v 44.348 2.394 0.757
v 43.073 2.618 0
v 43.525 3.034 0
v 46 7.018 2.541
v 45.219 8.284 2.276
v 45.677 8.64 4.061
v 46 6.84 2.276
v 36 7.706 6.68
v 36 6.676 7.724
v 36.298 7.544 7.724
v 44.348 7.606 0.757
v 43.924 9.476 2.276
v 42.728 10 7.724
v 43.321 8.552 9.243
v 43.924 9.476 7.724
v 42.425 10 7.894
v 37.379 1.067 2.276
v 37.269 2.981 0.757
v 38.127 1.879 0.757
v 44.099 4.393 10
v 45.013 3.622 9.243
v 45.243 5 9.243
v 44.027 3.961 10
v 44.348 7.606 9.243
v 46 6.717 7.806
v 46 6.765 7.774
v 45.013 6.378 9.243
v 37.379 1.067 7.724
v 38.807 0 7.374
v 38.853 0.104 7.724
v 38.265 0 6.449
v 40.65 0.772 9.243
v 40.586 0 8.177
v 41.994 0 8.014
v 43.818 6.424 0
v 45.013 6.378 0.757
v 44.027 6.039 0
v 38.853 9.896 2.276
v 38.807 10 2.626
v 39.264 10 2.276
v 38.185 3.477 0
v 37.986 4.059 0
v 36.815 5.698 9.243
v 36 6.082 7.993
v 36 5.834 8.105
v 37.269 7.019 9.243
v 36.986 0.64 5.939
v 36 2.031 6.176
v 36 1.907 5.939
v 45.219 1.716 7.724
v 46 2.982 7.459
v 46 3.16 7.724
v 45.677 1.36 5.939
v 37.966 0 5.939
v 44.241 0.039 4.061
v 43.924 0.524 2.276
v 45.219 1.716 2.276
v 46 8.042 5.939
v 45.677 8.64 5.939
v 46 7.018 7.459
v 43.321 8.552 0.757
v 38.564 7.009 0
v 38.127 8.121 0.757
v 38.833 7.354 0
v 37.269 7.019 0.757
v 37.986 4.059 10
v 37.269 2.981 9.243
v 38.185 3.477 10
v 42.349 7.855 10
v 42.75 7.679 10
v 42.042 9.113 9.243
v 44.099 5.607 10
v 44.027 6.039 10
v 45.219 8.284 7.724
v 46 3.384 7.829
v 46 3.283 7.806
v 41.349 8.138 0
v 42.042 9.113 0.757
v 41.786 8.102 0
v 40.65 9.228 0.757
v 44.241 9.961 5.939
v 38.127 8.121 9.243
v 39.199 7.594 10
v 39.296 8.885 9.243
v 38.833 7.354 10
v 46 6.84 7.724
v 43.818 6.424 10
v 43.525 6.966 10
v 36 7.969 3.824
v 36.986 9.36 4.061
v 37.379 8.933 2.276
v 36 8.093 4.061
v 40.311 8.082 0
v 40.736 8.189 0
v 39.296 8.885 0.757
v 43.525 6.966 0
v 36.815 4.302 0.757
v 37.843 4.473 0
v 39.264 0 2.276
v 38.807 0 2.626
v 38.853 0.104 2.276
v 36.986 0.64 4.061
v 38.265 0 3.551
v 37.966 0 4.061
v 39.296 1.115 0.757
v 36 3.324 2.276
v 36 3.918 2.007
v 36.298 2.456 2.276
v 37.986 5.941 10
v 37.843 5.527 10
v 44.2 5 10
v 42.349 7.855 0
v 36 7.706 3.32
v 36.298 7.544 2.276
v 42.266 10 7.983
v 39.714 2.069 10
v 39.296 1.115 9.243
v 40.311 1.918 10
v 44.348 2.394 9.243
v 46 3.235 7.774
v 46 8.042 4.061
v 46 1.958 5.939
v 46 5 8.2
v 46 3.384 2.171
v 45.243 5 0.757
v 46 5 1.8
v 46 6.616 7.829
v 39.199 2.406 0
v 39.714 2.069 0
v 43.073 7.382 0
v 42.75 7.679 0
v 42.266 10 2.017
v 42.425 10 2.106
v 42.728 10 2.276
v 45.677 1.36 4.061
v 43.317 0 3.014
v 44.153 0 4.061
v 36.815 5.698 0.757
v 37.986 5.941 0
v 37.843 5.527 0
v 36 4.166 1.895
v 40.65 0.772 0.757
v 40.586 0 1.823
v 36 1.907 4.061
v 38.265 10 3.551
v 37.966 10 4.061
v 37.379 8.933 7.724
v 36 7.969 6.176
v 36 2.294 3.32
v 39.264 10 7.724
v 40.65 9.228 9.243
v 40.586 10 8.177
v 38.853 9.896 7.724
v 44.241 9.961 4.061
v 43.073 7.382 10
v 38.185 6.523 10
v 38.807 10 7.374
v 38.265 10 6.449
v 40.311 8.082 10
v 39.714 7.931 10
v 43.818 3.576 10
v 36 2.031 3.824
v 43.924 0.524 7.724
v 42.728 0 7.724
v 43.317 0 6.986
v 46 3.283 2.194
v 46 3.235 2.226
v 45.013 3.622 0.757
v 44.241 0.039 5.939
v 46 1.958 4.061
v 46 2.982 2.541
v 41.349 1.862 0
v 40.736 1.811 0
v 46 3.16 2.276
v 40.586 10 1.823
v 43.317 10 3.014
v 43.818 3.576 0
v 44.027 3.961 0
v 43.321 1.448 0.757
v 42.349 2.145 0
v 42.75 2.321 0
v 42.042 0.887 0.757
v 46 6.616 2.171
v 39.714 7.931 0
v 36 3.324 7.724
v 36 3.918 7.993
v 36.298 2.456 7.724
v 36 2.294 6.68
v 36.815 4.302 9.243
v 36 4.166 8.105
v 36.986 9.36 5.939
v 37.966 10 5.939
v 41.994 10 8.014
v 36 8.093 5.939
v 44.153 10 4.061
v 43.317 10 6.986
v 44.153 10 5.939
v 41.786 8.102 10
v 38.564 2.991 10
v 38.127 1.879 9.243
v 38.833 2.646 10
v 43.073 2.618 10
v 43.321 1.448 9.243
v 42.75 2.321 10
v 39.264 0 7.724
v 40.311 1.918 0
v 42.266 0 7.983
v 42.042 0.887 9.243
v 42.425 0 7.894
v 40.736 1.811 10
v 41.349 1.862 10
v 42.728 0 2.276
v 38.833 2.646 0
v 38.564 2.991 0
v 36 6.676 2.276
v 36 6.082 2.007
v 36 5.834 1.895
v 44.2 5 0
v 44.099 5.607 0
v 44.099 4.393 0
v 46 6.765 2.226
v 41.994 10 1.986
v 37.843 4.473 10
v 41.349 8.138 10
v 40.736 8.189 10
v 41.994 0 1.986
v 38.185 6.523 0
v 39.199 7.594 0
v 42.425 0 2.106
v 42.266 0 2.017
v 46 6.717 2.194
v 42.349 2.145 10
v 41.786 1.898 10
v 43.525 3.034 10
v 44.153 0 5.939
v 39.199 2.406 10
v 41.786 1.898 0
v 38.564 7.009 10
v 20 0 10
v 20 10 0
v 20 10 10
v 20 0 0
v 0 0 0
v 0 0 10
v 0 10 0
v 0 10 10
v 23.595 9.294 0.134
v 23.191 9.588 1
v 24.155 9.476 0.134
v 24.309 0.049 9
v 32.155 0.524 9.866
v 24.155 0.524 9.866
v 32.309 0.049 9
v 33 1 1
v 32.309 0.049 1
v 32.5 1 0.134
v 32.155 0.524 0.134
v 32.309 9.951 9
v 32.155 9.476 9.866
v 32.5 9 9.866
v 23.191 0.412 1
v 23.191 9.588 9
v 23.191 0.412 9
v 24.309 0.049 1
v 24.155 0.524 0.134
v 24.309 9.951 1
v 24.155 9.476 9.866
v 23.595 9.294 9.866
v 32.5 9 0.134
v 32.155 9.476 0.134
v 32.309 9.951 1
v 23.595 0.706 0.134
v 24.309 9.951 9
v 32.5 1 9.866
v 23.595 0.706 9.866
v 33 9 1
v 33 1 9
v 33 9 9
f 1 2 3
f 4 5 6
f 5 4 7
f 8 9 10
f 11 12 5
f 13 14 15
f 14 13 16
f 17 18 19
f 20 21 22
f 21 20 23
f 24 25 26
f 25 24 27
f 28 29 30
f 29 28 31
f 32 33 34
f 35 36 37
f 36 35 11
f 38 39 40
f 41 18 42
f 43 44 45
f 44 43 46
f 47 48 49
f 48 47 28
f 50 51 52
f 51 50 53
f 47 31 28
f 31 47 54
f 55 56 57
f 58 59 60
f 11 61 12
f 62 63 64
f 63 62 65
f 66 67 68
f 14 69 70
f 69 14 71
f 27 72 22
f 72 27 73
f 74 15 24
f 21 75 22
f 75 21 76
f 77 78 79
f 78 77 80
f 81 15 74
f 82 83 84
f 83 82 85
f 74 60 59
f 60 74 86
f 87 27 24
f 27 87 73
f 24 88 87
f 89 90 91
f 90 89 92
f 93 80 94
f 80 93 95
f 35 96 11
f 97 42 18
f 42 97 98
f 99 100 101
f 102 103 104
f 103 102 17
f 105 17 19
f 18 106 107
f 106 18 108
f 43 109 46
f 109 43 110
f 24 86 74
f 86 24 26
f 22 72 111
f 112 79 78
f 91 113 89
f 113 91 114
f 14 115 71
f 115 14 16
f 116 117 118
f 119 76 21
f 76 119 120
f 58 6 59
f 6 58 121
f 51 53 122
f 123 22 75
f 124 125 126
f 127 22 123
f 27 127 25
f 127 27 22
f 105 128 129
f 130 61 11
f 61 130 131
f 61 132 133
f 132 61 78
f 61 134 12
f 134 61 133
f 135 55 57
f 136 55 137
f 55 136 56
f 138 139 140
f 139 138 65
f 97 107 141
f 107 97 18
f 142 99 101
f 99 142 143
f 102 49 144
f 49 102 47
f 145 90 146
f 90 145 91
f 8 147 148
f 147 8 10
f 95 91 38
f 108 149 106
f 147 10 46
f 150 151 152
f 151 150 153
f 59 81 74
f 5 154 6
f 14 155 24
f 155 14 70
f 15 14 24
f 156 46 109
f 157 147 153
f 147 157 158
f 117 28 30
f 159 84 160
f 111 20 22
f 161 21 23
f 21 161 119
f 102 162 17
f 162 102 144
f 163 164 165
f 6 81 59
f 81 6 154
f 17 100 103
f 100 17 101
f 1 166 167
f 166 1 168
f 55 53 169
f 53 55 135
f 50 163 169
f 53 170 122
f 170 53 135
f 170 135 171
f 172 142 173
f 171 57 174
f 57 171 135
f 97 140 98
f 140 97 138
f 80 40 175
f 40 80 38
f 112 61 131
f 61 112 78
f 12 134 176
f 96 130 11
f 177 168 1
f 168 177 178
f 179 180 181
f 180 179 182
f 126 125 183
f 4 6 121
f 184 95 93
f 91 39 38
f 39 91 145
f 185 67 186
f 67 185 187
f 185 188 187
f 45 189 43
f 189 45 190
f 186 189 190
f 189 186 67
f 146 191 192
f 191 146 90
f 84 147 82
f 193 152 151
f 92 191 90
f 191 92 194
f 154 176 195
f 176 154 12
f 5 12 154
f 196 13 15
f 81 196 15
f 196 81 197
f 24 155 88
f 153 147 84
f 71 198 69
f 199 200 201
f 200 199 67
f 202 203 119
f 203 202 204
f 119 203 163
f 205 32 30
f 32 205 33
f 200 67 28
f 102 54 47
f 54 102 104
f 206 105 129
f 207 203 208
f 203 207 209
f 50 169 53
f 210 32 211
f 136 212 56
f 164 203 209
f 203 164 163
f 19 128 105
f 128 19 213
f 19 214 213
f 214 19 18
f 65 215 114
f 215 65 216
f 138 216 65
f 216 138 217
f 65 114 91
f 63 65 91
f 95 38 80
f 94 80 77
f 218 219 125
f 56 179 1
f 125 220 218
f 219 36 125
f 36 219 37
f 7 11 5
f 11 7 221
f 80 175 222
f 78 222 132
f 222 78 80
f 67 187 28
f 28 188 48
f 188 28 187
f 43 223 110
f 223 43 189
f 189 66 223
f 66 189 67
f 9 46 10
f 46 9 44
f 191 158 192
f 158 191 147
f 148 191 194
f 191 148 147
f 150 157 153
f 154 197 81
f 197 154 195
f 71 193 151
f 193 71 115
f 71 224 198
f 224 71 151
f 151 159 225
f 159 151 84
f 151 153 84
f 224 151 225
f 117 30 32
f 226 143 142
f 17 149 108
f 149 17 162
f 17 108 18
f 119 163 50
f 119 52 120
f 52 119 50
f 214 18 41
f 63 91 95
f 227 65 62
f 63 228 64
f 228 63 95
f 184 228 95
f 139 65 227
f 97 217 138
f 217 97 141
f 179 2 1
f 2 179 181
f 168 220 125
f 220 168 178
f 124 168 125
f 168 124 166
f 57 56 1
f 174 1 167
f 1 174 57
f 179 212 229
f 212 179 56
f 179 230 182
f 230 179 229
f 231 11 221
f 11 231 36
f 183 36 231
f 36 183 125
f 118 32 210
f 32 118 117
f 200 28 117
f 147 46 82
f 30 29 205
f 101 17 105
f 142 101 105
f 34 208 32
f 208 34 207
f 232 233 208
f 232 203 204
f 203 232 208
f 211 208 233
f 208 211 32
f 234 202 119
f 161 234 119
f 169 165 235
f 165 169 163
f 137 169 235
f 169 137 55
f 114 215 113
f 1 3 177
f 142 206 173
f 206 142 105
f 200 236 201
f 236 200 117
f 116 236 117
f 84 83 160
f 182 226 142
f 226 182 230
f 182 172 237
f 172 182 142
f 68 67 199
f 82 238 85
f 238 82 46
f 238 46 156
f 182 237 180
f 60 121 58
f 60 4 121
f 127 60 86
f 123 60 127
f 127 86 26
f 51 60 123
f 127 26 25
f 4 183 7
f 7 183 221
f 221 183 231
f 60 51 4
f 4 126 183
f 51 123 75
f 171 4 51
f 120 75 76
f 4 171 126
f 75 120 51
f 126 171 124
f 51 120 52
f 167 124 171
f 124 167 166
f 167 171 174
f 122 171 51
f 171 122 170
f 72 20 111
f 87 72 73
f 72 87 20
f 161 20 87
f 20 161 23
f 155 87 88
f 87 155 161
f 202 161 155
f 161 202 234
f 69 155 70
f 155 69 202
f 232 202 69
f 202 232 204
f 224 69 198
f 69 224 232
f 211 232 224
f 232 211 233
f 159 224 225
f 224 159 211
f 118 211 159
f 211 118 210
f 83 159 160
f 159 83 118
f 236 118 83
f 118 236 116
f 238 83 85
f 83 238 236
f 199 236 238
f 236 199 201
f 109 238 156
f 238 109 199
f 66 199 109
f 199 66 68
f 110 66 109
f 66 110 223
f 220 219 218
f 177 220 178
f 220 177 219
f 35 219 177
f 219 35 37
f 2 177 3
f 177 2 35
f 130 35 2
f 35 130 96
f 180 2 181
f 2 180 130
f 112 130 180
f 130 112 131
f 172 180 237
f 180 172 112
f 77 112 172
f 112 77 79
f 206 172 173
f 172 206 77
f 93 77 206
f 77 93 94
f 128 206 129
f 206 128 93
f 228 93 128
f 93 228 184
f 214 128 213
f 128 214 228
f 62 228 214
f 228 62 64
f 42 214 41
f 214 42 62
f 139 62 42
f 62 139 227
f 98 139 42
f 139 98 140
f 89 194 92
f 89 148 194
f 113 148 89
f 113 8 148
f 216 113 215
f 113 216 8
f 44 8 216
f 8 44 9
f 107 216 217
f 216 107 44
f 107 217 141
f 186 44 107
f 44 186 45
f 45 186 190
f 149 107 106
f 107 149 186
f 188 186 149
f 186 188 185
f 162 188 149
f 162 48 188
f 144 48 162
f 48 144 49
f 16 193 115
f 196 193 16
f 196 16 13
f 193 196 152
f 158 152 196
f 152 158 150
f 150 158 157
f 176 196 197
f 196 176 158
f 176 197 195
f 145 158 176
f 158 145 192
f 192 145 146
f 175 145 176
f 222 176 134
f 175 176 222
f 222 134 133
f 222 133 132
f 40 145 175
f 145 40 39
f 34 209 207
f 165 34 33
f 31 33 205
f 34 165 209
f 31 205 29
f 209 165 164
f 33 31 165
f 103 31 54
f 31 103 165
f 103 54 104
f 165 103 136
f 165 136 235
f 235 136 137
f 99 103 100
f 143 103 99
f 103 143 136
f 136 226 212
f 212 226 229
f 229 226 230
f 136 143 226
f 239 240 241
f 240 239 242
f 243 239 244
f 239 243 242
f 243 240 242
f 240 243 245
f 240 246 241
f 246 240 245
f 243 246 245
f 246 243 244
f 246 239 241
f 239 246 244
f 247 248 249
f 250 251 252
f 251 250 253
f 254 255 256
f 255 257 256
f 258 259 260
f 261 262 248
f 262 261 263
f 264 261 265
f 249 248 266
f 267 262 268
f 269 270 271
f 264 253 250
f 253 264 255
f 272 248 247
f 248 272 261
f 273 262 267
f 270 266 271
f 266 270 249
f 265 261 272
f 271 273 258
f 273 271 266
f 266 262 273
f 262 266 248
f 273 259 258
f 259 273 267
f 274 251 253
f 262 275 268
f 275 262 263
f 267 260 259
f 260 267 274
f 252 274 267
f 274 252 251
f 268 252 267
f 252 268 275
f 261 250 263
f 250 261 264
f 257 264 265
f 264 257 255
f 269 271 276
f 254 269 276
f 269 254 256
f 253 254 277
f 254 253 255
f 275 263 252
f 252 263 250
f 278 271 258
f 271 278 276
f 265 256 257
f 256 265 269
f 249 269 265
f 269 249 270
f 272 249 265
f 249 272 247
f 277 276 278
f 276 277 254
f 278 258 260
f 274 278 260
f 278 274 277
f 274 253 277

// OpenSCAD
// Volume: 3698.086155299118, SurfaceArea: 1958.4186780958667
color("red") hull() {
  cube(10);
  translate([10,0,0]) cube(10);
}
translate ([24,1,1]) color("green") minkowski() {
    cube(8);
    sphere(1);
  }
translate([41,5,5]) color("blue") resize() {
  intersection() {  
    sphere(r=6);
    cube(10, center=true);
  }
}
